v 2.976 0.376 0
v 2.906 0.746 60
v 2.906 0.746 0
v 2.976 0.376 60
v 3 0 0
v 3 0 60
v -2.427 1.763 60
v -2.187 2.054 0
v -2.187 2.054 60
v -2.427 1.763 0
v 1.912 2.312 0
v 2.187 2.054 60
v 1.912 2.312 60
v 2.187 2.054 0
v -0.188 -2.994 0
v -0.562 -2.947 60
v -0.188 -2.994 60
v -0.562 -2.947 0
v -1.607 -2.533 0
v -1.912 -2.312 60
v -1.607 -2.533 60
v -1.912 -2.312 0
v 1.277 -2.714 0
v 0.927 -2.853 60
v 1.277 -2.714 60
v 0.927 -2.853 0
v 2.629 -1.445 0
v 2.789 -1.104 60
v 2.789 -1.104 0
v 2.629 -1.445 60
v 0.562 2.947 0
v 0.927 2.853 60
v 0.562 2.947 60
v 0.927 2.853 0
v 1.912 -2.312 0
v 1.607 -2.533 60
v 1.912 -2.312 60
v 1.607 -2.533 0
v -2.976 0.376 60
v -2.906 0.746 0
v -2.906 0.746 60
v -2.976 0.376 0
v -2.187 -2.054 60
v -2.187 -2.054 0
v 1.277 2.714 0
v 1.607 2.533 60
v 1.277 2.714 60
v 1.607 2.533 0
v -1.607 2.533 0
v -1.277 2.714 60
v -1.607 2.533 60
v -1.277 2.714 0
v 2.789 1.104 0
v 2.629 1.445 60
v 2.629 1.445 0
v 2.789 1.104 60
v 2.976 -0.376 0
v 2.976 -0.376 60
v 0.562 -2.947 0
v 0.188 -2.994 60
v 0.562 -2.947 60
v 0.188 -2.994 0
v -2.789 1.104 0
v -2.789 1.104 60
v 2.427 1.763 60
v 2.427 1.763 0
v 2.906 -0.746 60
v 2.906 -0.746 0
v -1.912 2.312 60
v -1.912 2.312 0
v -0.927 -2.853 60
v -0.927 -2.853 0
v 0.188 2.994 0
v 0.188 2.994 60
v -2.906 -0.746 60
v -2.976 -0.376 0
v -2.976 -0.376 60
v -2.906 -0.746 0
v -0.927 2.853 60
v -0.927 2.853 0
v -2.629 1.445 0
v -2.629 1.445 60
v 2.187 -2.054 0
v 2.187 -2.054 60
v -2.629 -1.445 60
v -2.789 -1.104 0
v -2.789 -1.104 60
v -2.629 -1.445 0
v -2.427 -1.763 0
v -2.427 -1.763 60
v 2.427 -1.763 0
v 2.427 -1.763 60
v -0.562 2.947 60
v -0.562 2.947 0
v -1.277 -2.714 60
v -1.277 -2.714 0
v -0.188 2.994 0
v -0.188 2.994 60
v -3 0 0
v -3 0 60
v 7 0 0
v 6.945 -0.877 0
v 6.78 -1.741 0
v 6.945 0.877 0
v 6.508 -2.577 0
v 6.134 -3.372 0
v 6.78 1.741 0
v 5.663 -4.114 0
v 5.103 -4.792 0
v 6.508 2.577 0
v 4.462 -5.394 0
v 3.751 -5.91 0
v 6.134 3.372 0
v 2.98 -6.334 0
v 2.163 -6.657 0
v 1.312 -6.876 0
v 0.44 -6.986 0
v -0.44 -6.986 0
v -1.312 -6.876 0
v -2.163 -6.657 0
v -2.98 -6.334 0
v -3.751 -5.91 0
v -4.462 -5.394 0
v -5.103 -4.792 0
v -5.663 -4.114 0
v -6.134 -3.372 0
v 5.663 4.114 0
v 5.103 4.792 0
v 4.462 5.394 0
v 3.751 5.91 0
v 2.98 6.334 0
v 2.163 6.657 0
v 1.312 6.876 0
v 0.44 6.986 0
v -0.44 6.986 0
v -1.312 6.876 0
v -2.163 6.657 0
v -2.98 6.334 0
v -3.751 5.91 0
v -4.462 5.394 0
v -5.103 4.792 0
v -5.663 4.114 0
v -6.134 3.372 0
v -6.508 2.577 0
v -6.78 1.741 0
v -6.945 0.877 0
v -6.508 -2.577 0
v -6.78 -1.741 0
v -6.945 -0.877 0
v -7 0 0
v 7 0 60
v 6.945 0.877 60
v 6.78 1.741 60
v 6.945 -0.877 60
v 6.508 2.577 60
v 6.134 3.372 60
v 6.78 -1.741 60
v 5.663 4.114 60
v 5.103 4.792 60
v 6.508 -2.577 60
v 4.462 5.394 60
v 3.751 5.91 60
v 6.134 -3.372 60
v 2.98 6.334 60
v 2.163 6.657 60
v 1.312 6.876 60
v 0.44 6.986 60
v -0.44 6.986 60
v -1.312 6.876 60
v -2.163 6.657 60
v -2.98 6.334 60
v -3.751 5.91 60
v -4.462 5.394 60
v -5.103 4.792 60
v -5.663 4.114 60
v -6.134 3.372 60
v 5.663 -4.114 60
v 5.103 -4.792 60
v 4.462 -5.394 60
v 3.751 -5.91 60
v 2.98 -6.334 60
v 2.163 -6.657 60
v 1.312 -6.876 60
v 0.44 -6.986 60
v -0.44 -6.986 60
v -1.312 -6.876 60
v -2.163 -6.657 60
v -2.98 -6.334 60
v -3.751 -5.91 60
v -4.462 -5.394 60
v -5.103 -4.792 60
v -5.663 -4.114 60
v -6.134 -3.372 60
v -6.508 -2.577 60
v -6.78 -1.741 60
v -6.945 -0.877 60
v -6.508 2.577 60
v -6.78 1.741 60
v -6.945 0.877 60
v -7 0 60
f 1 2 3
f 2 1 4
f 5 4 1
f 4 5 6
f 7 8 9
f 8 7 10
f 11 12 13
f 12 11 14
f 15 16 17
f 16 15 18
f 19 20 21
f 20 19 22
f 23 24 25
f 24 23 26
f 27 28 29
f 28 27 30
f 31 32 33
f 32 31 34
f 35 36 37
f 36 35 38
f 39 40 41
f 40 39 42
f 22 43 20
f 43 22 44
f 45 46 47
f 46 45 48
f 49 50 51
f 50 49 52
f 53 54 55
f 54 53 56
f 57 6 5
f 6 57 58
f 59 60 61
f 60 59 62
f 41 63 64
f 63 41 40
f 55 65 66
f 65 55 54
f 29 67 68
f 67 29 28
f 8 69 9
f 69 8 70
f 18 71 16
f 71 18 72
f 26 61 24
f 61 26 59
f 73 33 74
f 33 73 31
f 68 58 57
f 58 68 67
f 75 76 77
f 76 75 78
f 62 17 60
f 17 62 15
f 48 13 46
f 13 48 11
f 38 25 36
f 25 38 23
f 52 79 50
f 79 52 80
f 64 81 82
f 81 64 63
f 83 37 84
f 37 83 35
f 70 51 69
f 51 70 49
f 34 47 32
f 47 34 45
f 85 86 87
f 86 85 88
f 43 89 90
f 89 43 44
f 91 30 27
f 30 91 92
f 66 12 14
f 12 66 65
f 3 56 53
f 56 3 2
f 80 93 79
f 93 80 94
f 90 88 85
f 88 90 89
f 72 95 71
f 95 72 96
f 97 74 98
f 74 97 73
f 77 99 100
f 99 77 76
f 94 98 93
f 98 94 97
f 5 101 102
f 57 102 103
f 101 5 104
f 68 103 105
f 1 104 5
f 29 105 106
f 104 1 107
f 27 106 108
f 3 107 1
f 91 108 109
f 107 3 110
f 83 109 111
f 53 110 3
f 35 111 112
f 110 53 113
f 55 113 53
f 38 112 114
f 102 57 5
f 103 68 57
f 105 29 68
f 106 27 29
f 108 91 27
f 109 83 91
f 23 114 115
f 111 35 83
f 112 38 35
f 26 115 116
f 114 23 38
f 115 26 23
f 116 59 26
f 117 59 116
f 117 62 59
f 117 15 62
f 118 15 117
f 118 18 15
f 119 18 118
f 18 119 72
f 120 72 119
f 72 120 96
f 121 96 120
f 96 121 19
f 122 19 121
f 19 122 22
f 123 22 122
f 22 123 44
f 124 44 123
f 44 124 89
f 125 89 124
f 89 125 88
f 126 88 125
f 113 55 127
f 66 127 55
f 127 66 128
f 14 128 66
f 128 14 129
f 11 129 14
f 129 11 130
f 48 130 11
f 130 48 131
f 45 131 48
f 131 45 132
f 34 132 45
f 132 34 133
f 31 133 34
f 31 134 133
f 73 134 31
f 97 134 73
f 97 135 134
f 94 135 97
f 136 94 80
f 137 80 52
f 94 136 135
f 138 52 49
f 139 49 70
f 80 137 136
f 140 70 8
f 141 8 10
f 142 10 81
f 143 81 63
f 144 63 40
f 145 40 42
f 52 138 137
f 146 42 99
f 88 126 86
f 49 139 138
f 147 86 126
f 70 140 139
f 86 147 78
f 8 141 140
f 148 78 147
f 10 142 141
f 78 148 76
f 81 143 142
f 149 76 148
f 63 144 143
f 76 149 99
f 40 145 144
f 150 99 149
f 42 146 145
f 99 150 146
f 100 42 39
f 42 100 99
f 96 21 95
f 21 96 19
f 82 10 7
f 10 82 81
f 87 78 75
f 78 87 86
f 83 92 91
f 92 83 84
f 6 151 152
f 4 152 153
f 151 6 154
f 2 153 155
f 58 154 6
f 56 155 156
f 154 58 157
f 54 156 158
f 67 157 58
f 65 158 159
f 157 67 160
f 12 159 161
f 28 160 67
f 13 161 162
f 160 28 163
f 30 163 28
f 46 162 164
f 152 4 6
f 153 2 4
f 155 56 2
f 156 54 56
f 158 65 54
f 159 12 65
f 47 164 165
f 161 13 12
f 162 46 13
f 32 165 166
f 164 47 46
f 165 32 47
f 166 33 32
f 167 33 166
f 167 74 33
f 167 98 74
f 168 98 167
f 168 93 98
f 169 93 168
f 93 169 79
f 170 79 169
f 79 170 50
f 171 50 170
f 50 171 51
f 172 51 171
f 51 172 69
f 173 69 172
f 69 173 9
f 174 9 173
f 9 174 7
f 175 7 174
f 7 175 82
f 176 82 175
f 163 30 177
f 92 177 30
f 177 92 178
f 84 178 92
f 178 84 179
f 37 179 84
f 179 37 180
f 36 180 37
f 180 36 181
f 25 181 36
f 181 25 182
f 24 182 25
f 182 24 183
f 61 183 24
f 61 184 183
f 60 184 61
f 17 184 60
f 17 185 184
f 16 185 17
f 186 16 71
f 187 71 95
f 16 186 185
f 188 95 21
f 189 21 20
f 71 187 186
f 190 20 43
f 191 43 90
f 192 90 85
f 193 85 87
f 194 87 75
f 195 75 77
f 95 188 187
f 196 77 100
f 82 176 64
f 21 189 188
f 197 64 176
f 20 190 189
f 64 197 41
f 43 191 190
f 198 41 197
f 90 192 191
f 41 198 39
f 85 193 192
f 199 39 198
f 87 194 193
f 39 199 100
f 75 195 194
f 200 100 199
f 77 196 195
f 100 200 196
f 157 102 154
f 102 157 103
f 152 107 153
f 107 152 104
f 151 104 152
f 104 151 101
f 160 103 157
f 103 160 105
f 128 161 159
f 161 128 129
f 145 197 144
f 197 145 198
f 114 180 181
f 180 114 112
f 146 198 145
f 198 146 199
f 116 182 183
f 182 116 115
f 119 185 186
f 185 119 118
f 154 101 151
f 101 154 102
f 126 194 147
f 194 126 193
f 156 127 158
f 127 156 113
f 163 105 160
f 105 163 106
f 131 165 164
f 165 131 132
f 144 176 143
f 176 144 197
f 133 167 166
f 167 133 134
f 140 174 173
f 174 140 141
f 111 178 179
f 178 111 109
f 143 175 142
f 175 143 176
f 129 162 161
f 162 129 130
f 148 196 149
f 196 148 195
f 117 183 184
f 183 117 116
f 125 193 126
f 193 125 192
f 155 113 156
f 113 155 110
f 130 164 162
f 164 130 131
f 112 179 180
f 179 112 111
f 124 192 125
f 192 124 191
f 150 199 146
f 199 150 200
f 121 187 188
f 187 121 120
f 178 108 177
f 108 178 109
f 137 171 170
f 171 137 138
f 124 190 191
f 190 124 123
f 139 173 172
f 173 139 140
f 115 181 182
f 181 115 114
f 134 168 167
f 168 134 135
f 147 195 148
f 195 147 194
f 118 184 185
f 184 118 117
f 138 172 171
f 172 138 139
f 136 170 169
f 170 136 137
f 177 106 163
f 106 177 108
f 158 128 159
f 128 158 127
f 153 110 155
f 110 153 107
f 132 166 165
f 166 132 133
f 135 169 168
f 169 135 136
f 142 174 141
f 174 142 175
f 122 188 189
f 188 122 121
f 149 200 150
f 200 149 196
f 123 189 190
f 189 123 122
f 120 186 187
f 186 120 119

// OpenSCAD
$fn = 50;

difference() {
	union() {
		cylinder(h = 60, r = 7.0);
	}
	union() {
		cylinder(h = 60, r = 3.0);
		cylinder(h = 60, r = 1.5);
	}
}
